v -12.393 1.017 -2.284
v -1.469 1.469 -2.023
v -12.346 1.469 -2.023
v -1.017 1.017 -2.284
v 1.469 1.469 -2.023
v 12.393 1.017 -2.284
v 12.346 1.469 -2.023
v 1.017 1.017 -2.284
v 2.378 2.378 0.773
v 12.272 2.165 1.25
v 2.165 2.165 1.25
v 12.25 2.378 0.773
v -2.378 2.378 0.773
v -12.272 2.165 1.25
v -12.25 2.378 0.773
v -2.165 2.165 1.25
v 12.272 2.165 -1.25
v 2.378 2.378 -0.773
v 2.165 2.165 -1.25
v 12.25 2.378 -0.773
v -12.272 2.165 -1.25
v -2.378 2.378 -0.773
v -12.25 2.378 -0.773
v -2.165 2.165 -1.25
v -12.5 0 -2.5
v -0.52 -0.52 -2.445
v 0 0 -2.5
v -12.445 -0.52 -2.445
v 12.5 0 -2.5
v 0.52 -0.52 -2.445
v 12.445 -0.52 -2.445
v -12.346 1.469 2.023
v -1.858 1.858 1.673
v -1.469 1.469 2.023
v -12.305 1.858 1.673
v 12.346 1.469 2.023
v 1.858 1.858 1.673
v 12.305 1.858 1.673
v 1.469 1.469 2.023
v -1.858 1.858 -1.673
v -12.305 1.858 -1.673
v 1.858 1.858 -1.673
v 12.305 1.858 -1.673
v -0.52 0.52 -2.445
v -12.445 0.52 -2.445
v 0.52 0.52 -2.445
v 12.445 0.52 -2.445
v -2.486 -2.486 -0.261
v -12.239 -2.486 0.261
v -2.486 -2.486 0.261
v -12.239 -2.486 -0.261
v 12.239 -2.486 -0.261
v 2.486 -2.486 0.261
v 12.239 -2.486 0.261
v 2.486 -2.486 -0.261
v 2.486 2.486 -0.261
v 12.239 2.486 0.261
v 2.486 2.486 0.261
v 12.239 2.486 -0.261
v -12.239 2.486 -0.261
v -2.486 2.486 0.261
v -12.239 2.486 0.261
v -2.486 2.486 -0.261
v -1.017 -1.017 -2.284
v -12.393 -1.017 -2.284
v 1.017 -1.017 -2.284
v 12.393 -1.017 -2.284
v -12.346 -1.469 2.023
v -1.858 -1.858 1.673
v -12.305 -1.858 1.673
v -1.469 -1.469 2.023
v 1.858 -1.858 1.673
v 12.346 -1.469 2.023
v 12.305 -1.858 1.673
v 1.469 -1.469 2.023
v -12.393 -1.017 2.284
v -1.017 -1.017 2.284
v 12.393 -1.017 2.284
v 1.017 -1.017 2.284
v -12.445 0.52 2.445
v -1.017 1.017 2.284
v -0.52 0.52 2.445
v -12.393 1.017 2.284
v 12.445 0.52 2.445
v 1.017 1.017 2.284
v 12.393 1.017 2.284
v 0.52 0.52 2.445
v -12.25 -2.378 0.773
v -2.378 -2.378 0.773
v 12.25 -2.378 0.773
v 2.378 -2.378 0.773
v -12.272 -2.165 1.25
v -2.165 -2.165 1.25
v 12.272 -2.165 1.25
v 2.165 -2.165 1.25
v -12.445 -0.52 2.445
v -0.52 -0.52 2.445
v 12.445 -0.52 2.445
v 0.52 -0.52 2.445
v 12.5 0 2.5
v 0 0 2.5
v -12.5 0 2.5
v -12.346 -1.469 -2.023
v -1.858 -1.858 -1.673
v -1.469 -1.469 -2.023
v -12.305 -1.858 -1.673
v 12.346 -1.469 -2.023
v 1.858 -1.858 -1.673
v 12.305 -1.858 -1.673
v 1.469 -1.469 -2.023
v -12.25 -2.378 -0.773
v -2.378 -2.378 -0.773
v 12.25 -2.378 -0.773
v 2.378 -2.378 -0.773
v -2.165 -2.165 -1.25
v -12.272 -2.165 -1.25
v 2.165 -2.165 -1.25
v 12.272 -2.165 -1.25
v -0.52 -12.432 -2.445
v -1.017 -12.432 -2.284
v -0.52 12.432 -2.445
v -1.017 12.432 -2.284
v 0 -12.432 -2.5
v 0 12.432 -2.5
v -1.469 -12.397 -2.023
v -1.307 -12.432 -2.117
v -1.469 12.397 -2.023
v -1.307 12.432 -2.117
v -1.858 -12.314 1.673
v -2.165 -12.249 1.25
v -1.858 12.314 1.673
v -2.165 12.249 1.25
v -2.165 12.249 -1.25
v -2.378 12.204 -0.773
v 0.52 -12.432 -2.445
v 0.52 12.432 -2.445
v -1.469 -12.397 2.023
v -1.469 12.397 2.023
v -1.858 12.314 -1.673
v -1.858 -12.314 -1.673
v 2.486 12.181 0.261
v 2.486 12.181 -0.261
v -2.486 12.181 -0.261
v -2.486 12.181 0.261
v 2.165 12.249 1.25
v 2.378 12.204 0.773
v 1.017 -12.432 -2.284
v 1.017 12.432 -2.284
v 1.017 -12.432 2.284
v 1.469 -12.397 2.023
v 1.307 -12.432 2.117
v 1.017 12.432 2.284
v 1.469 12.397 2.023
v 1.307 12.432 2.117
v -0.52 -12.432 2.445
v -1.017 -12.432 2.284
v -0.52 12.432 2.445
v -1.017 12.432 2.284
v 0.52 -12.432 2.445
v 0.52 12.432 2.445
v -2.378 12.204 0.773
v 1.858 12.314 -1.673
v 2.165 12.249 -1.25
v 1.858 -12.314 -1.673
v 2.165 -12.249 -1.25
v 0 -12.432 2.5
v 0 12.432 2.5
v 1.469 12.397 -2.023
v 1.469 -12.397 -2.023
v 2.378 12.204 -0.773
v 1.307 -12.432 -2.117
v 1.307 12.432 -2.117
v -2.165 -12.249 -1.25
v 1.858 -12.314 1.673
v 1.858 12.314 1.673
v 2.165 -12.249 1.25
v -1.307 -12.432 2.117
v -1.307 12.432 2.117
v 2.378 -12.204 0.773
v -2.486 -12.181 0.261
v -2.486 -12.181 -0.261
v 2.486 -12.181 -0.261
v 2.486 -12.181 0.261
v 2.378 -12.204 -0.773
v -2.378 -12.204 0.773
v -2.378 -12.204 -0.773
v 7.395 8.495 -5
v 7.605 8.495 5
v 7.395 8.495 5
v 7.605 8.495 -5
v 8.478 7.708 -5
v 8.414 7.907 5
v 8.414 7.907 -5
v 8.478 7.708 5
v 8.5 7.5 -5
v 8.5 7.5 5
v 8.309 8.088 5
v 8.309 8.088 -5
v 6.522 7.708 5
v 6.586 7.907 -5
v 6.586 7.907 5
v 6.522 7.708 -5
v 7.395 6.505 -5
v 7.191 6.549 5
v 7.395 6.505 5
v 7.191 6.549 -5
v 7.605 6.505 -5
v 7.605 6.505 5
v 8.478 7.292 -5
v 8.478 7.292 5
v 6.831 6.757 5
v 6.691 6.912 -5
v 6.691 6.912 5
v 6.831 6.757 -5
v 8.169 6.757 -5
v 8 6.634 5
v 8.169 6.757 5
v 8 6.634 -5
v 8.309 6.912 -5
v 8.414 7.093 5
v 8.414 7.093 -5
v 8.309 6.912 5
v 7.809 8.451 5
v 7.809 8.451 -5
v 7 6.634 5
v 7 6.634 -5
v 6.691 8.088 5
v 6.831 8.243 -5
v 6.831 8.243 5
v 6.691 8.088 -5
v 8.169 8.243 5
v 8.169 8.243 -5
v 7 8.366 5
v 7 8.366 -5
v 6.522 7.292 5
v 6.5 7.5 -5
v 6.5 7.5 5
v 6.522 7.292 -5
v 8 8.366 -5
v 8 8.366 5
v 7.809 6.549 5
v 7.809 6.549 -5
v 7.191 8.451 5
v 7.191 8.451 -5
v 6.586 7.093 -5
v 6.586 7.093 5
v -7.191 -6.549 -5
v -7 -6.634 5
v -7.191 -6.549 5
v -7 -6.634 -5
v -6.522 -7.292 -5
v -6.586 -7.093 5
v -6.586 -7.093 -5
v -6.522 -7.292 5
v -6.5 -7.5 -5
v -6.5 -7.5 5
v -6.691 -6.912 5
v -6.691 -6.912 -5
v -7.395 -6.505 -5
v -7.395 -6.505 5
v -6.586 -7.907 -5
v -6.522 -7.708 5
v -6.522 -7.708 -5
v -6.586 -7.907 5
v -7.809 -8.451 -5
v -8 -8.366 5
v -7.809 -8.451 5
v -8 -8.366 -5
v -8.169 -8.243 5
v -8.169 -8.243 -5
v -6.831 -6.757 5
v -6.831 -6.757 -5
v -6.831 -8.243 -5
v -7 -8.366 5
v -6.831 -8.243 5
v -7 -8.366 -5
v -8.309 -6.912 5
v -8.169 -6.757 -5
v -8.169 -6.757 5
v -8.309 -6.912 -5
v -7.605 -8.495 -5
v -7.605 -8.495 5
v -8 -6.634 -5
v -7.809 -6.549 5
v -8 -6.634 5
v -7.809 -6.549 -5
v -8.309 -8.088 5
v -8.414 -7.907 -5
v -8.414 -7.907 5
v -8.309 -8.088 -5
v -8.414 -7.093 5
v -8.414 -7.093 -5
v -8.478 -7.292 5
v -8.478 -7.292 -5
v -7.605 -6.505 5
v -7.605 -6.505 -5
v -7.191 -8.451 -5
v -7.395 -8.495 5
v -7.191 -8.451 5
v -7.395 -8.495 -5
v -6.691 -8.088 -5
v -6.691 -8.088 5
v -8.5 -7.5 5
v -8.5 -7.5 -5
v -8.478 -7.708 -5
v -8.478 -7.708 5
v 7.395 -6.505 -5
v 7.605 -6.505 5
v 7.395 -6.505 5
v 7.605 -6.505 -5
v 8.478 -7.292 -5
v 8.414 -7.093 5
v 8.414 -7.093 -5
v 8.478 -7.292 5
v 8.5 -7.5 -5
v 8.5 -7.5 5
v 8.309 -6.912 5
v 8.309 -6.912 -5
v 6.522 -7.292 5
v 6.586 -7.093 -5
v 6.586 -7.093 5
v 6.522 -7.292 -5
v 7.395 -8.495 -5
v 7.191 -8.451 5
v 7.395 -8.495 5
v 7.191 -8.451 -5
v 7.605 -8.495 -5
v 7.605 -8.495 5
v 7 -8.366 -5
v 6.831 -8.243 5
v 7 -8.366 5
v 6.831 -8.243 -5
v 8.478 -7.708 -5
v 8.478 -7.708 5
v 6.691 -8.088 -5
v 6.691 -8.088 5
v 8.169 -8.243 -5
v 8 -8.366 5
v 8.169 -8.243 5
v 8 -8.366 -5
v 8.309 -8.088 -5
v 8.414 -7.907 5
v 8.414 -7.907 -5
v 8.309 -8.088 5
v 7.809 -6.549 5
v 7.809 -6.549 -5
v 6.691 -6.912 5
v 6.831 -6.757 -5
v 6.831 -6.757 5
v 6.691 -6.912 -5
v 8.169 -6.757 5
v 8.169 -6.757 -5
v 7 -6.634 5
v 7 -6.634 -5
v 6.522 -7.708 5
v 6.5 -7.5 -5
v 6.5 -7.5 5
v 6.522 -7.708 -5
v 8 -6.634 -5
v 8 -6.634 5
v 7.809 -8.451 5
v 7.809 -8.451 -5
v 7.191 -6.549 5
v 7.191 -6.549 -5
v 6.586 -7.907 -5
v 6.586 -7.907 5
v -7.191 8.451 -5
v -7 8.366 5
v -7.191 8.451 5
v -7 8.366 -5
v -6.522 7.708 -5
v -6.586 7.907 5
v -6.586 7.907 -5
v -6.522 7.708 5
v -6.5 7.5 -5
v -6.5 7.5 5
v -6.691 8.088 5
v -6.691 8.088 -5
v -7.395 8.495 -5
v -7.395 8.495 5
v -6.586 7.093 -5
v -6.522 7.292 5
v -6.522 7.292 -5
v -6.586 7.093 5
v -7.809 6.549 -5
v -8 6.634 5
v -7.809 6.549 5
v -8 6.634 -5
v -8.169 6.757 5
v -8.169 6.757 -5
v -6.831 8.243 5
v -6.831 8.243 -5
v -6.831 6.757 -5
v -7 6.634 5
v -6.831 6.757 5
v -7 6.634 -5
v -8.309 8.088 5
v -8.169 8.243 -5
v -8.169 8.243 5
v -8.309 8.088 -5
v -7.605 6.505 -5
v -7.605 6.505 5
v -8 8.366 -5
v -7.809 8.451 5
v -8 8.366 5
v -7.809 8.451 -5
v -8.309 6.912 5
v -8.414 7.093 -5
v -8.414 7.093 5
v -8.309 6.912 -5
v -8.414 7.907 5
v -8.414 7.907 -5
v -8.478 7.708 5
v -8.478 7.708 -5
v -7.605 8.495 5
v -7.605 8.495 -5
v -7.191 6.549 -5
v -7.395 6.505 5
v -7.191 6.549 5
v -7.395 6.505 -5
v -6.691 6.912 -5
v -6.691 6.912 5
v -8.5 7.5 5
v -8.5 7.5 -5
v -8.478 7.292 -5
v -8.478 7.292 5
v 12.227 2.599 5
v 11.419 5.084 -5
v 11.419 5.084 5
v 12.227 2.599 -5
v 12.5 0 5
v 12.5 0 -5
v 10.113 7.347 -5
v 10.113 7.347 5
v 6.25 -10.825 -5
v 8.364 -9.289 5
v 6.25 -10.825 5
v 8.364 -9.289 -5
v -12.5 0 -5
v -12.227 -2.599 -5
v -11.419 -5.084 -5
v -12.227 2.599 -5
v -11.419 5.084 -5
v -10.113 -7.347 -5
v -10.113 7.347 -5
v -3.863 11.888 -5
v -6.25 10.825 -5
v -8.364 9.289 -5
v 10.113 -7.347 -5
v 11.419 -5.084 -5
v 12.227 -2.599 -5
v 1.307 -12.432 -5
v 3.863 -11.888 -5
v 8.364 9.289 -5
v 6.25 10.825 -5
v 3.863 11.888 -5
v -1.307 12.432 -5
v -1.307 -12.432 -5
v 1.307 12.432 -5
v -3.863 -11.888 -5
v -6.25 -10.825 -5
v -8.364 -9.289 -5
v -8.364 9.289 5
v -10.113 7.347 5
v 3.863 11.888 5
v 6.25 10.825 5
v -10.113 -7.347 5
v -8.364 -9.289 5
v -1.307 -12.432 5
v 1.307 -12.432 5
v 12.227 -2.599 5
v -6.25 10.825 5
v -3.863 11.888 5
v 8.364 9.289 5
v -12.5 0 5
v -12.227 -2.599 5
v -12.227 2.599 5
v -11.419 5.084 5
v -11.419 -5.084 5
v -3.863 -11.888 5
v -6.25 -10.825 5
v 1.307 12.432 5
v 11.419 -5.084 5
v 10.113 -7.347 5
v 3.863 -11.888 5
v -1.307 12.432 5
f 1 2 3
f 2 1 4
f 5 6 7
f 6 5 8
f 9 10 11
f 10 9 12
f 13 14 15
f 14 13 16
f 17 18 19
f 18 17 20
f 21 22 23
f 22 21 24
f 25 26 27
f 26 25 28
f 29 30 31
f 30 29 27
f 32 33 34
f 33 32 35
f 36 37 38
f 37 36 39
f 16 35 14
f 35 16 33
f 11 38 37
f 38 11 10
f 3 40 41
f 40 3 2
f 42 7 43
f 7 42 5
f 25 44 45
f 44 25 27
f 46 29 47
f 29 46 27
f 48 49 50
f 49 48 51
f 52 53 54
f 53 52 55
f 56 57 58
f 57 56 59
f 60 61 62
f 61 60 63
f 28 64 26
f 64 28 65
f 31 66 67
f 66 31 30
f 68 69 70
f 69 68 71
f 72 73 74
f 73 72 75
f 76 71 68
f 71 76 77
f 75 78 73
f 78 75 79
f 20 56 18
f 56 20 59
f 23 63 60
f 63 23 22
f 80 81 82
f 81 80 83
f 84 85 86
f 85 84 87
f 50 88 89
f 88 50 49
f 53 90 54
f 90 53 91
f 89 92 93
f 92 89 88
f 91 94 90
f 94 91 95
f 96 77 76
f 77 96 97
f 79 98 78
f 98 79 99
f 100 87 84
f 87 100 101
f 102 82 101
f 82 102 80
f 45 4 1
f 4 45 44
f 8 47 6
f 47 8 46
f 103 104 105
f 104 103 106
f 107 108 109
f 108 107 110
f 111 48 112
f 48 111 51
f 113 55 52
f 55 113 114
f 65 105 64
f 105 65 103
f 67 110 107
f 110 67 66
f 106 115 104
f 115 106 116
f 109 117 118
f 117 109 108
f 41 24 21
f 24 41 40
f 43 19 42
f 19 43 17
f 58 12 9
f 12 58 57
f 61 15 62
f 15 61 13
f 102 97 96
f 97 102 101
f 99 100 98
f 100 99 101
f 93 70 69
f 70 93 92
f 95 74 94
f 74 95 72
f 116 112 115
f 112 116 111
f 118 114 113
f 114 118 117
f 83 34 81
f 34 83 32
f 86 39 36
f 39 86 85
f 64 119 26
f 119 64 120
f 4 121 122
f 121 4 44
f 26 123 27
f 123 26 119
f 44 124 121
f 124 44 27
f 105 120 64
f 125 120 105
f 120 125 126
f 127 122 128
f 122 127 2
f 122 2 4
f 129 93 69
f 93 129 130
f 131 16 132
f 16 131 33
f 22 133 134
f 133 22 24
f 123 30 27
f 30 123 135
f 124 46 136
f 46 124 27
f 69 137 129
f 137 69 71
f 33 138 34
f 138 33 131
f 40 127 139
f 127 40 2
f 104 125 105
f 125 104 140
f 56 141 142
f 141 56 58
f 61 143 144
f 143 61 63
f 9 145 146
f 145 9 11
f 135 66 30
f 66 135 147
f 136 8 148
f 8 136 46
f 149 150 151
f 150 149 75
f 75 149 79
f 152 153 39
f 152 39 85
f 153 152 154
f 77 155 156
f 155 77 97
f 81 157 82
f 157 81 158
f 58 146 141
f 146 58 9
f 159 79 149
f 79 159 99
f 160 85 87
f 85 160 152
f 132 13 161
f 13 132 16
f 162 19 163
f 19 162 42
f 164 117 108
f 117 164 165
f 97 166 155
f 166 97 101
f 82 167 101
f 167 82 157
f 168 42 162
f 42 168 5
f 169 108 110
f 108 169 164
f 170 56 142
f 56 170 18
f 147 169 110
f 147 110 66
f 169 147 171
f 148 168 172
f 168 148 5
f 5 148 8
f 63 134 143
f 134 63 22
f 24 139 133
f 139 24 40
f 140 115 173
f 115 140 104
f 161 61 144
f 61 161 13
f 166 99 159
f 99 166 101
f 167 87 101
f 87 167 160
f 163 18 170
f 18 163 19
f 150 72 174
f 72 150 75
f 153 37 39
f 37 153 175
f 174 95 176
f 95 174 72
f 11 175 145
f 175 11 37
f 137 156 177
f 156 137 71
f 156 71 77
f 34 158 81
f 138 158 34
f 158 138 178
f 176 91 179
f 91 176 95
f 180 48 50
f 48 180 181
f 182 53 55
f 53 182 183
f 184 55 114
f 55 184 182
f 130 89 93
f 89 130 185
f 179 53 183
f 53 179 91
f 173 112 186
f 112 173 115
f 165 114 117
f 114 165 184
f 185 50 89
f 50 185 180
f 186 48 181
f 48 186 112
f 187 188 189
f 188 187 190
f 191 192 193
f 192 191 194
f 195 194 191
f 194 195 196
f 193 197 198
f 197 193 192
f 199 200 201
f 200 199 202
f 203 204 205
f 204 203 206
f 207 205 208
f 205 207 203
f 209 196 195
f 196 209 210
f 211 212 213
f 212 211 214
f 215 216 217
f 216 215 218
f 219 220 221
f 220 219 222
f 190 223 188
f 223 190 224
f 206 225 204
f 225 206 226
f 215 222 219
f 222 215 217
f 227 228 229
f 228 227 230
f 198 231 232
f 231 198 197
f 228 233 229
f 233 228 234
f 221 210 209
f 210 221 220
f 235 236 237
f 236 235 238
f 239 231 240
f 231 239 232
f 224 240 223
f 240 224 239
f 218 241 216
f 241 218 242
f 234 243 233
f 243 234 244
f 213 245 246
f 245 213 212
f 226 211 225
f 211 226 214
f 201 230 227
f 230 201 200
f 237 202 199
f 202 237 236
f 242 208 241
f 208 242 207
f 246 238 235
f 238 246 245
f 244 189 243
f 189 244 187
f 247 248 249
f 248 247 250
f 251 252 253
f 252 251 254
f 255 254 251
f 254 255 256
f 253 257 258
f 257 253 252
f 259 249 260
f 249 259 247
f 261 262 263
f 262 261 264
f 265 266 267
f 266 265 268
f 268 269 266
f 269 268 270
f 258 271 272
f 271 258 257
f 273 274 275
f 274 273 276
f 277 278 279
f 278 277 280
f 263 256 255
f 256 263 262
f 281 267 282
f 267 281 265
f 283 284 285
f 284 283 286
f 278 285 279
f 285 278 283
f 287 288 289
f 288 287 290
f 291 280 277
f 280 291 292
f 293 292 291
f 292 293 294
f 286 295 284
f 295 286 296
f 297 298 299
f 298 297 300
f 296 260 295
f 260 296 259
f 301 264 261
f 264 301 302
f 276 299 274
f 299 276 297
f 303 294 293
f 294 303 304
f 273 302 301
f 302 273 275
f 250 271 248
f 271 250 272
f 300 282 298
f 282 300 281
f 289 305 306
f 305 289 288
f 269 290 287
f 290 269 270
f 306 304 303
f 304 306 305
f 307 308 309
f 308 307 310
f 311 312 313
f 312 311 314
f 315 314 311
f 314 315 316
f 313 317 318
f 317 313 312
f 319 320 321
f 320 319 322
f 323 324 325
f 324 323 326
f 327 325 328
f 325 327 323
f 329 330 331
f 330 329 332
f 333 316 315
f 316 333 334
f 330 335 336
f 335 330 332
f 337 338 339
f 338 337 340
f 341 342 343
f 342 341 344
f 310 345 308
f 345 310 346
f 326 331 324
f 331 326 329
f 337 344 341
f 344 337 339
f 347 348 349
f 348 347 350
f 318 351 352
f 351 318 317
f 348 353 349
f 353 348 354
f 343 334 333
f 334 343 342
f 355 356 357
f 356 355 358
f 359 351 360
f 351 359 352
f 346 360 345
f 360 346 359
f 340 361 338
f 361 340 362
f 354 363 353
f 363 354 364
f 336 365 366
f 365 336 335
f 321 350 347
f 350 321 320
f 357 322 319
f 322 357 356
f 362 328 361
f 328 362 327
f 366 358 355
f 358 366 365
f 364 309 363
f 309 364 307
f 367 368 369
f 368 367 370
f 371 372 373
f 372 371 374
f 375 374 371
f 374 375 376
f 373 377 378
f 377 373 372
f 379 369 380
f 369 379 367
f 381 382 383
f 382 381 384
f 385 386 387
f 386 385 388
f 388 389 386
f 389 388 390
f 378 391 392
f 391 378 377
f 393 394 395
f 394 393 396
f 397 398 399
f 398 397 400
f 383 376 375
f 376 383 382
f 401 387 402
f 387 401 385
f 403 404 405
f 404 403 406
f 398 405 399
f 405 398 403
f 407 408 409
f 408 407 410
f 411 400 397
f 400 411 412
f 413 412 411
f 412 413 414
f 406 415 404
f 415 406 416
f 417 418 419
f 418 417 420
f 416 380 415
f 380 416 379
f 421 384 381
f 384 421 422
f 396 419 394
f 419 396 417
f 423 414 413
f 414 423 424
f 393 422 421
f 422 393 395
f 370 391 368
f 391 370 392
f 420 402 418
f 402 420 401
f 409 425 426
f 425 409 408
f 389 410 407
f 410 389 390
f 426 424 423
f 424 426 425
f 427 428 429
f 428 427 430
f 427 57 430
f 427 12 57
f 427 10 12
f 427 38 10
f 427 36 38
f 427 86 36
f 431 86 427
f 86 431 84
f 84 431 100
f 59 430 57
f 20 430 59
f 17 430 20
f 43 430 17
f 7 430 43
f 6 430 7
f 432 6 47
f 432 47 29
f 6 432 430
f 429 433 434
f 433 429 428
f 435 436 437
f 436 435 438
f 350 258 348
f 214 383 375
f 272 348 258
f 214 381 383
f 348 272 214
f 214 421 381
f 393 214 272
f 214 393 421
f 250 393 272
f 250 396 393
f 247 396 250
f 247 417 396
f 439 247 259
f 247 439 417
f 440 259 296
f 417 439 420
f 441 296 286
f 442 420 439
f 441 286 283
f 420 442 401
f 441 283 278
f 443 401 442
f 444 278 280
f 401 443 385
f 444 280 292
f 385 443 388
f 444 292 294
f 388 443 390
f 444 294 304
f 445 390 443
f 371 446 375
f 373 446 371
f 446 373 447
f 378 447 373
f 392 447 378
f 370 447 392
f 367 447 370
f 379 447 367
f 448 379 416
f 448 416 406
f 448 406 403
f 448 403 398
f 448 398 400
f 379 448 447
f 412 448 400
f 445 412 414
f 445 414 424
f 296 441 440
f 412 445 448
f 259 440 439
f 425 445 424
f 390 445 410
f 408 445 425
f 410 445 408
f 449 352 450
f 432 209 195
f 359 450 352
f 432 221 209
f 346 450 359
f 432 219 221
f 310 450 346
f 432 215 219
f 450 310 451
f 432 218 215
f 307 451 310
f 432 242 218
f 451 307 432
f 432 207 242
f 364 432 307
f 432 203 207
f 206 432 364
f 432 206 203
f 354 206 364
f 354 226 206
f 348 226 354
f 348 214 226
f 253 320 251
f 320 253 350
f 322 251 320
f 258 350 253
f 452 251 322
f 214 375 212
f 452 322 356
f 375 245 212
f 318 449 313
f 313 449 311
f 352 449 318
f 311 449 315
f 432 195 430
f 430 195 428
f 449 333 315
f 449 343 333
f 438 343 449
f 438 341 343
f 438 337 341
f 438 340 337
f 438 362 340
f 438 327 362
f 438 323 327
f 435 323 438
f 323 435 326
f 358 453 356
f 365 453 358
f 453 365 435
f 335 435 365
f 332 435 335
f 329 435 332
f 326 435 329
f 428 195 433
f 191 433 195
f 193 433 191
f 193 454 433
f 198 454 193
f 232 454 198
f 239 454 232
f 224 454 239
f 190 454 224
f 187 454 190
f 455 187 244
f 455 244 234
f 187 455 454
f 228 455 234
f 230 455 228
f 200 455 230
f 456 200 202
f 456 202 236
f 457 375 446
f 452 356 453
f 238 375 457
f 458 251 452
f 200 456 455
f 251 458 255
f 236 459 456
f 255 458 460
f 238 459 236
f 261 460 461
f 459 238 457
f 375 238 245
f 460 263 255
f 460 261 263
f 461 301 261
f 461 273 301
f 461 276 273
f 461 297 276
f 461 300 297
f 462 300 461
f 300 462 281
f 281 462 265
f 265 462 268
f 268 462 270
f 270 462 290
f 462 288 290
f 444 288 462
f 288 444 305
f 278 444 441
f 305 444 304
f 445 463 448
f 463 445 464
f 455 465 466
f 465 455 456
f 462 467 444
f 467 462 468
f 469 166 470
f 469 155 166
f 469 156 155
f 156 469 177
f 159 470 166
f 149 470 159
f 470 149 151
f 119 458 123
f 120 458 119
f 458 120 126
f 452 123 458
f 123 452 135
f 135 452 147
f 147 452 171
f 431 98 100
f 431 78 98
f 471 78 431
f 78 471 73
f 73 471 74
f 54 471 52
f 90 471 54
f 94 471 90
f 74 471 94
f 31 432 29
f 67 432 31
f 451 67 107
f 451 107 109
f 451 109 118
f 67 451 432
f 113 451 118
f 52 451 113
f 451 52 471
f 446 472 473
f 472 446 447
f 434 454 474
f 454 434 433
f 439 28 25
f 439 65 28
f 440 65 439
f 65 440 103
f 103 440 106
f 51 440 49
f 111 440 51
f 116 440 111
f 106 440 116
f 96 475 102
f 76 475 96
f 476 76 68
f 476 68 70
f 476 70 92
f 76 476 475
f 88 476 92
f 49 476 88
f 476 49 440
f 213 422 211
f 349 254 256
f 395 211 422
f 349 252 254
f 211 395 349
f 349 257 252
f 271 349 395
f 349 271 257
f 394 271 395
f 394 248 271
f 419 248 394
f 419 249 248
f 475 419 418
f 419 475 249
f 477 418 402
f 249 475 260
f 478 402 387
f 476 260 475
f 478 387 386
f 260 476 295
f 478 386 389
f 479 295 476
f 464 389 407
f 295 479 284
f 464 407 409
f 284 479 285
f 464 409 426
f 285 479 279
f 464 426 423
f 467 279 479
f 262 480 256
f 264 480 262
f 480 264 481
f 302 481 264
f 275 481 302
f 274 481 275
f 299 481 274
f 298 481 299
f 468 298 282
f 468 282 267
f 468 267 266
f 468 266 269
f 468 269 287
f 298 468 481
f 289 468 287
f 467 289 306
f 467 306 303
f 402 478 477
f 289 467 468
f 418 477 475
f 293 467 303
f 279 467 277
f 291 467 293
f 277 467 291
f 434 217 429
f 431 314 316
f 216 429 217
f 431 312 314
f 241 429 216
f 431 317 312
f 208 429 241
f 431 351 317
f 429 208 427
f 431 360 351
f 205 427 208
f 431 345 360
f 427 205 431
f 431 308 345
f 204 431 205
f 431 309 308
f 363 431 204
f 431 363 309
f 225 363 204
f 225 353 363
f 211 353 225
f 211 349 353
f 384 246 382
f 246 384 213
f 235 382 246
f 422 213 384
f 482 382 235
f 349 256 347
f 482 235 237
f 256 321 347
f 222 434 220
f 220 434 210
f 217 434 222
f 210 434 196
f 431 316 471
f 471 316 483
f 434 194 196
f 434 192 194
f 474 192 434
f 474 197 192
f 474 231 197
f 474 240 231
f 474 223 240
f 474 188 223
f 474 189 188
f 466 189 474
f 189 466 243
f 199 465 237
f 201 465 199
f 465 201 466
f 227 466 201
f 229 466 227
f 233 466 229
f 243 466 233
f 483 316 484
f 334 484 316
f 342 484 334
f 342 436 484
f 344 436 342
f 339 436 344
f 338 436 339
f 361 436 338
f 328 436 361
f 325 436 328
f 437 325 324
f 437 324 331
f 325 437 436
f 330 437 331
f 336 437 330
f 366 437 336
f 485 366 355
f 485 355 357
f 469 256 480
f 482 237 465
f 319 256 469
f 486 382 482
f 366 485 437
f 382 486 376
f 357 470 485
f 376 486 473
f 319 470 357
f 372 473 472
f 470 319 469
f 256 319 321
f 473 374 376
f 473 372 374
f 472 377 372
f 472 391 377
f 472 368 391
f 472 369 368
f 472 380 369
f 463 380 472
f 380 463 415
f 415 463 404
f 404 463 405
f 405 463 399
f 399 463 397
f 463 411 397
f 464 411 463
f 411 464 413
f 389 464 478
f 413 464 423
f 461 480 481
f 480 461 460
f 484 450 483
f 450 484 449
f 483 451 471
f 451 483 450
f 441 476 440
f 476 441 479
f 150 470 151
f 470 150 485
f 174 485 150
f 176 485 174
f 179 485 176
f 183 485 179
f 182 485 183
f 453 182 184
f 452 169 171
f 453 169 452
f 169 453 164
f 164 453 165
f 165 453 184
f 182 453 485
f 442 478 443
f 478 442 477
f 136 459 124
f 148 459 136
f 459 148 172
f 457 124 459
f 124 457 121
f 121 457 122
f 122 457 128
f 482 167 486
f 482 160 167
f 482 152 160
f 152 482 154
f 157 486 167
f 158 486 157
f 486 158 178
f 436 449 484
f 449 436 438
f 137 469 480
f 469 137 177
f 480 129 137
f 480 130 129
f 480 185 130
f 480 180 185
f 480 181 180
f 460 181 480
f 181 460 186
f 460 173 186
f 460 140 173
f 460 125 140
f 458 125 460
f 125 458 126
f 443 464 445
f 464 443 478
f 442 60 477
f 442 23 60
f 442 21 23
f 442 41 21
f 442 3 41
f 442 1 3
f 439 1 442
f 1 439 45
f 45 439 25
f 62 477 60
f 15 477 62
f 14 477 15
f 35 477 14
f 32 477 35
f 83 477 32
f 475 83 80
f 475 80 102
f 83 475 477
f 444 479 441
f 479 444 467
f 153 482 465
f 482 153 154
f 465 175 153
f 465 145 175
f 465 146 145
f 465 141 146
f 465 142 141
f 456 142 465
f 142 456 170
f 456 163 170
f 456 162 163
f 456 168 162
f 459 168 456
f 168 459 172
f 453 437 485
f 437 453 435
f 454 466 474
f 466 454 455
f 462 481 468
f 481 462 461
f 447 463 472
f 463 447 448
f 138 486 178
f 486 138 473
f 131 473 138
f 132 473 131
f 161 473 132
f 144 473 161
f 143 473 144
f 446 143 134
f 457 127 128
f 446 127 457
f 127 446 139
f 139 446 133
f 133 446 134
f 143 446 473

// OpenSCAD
//include <ISOThread.scad>;

$fn = 30;
phasen = 2;
faktor = 2;
anzahl = phasen * faktor;
toleranz_nut = 0.1;

// ####### COMPLETE MODEL
//complete();

// ####### PRINTING

//spulenaufnahmen();
//halterung();
kern();

// ####### TESTING
//spulenaufnahmen();
//spulenkerne();
//spulenkern();
//halterung();
//m4nut();

module complete(){
    halterung();
    antriebsspulen();
    kern();
    alle_spulenaufnahmen();
}

module kern(){
    difference(){
        cylinder(h=10,r=25/2, center= true);
        {
            magnetloecher();
            schnurloecher();
        }
    }
}

module magnetloecher(){
    schrittweite = 360 / anzahl;
    for (i = [0:anzahl]) {
        rotate([0,0,i*schrittweite])translate([8,0,0])rotate([0,90,0])cylinder(h=20, r=2.5, center = true);
    }
}

module schnurloecher(){
    distanz=7.5;
    
    translate([distanz,distanz,0])cylinder(h=20,r=1, center= true);
    translate([-distanz,-distanz,0])cylinder(h=20,r=1, center= true);
    translate([distanz,-distanz,0])cylinder(h=20,r=1, center= true);
    translate([-distanz,distanz,0])cylinder(h=20,r=1, center= true);
}


module spulenkerne(){
    rotate([0,45,0])translate([18,0,0])rotate([0,90,0])spulenkern();
    rotate([0,-45,0])translate([18,0,0])rotate([0,90,0])spulenkern();
    rotate([0,0,0])translate([18,0,0])rotate([0,90,0])spulenkern();
}

module spulenaufnahmen(){
    
    rotate([0,-45,0])difference(){
        translate([26,0,0])spulenaufnahme();
        translate([26,0,0])rotate([0,90,0])m4nut();
    }
    rotate([0,0,0])difference(){
        translate([26,0,0])spulenaufnahme();
        translate([26,0,0])rotate([0,90,0])m4nut();
    }
    rotate([0,45,0])difference(){
        translate([26,0,0])spulenaufnahme();
        translate([26,0,0])rotate([0,90,0])m4nut();
    }
    
}

module spulenkern(){
    difference(){
        union(){
            cylinder(h=10,r=3, center= true);
            //translate([0,0,-5])cylinder(h=1,r=5, center= true);
            //translate([0,0,5])cylinder(h=1,r=5, center= true);
            translate([0,0,4.5])rotate([0,0,180/6])nut(6,1,0);
            translate([0,0,-5.5])rotate([0,0,180/6])nut(6,1,0);
        }
        union(){
            cylinder(h=12,r=2.5, center= true);
            translate([4.3,0,0])cube([2.5,1,12], true);
        }
    }  
}

module antriebsspulen(){
    schrittweite = 360 / anzahl;
    for (i = [0:anzahl]) {
        rotate([0,0,i*schrittweite])translate([8,0,0])spulenkerne();
    }
}

module halterung(){
    distance = 73;
    
    
    difference()
    {
        rotate([0,0,45])cube([65,65,10],true);
        union()
        {
            //center hole
            cylinder(h=15,r=25,center=true);
            
            //divider
            rotate([0,0,45])cube([0.5,100,20],true);
            
            //cutoff edges for spulenhalter
            cube([distance,11,11],true);
            rotate([0,0,90])cube([distance,11,11],true);
            //holes edges
            rotate([0,90,0])cylinder(h=100,r=2.5,center=true);
            rotate([0,90,90])cylinder(h=100,r=2.5,center=true);
            
            translate([0,52,0])cube([20,20,20],true);
            translate([0,-52,0])cube([20,20,20],true);
            translate([52,0,0])cube([20,20,20],true);
            translate([-52,0,0])cube([20,20,20],true);            
            
            //holes for stabilbaukasten
            rotate([0,0,45])union(){
                translate([0,5,0]) rotate([0,90,0])  cylinder(h=80,r=2.5,center=true);
                translate([22,5,0]) rotate([0,90,0])  m4nut();
                translate([-26,5,0]) rotate([0,90,0])  m4nut();
                
                translate([0,-5,0]) rotate([0,90,0])cylinder(h=80,r=2.5,center=true);
                translate([22,-5,0]) rotate([0,90,0])  m4nut();
                translate([-26,-5,0]) rotate([0,90,0])  m4nut();

                translate([-5,0,0]) rotate([0,90,90])cylinder(h=80,r=2.5,center=true);
                translate([-5,22,0]) rotate([0,90,90])  m4nut();
                translate([-5,-26,0]) rotate([0,90,90])  m4nut();
                
                translate([5,0,0]) rotate([0,90,90])cylinder(h=80,r=2.5,center=true);
                translate([5,22,0]) rotate([0,90,90])  m4nut();
                translate([5,-26,0]) rotate([0,90,90])  m4nut();
            }
        }       
    }
            
}

module spulenaufnahme(){
    difference()
    {
        cube([5,10,23],true);
        rotate([0,90,0])cylinder(h=6,r=2.5,center=true);
    }
}

module alle_spulenaufnahmen(){
    schrittweite = 360 / anzahl;
    for (i = [0:anzahl]) {
        rotate([0,0,i*schrittweite])translate([8,0,0])spulenaufnahmen();
    }
}

module m4nut(){
    //WrenchSizes=1;
    //translate([0,0,2])hex_nut(4);
    scale([1+toleranz_nut,1+toleranz_nut,1])union()    {
        color("blue") translate([-2,-3.5,0])cube([4,7,4]);
        color("blue") rotate([0,0,180/3])translate([-2,-3.5,0])cube([4,7,4]);
        color("blue") rotate([0,0,-180/3])translate([-2,-3.5,0])cube([4,7,4]);
    }
}

module nut(size, height, toleranz){
    factor = size/4;
    scale([factor+toleranz,factor+toleranz,1])union(){
        color("red") translate([-2,-3.5,0])cube([4,7,height]);
        color("red") rotate([0,0,180/3])translate([-2,-3.5,0])cube([4,7,height]);
        color("red") rotate([0,0,-180/3])translate([-2,-3.5,0])cube([4,7,height]);
    }
}
